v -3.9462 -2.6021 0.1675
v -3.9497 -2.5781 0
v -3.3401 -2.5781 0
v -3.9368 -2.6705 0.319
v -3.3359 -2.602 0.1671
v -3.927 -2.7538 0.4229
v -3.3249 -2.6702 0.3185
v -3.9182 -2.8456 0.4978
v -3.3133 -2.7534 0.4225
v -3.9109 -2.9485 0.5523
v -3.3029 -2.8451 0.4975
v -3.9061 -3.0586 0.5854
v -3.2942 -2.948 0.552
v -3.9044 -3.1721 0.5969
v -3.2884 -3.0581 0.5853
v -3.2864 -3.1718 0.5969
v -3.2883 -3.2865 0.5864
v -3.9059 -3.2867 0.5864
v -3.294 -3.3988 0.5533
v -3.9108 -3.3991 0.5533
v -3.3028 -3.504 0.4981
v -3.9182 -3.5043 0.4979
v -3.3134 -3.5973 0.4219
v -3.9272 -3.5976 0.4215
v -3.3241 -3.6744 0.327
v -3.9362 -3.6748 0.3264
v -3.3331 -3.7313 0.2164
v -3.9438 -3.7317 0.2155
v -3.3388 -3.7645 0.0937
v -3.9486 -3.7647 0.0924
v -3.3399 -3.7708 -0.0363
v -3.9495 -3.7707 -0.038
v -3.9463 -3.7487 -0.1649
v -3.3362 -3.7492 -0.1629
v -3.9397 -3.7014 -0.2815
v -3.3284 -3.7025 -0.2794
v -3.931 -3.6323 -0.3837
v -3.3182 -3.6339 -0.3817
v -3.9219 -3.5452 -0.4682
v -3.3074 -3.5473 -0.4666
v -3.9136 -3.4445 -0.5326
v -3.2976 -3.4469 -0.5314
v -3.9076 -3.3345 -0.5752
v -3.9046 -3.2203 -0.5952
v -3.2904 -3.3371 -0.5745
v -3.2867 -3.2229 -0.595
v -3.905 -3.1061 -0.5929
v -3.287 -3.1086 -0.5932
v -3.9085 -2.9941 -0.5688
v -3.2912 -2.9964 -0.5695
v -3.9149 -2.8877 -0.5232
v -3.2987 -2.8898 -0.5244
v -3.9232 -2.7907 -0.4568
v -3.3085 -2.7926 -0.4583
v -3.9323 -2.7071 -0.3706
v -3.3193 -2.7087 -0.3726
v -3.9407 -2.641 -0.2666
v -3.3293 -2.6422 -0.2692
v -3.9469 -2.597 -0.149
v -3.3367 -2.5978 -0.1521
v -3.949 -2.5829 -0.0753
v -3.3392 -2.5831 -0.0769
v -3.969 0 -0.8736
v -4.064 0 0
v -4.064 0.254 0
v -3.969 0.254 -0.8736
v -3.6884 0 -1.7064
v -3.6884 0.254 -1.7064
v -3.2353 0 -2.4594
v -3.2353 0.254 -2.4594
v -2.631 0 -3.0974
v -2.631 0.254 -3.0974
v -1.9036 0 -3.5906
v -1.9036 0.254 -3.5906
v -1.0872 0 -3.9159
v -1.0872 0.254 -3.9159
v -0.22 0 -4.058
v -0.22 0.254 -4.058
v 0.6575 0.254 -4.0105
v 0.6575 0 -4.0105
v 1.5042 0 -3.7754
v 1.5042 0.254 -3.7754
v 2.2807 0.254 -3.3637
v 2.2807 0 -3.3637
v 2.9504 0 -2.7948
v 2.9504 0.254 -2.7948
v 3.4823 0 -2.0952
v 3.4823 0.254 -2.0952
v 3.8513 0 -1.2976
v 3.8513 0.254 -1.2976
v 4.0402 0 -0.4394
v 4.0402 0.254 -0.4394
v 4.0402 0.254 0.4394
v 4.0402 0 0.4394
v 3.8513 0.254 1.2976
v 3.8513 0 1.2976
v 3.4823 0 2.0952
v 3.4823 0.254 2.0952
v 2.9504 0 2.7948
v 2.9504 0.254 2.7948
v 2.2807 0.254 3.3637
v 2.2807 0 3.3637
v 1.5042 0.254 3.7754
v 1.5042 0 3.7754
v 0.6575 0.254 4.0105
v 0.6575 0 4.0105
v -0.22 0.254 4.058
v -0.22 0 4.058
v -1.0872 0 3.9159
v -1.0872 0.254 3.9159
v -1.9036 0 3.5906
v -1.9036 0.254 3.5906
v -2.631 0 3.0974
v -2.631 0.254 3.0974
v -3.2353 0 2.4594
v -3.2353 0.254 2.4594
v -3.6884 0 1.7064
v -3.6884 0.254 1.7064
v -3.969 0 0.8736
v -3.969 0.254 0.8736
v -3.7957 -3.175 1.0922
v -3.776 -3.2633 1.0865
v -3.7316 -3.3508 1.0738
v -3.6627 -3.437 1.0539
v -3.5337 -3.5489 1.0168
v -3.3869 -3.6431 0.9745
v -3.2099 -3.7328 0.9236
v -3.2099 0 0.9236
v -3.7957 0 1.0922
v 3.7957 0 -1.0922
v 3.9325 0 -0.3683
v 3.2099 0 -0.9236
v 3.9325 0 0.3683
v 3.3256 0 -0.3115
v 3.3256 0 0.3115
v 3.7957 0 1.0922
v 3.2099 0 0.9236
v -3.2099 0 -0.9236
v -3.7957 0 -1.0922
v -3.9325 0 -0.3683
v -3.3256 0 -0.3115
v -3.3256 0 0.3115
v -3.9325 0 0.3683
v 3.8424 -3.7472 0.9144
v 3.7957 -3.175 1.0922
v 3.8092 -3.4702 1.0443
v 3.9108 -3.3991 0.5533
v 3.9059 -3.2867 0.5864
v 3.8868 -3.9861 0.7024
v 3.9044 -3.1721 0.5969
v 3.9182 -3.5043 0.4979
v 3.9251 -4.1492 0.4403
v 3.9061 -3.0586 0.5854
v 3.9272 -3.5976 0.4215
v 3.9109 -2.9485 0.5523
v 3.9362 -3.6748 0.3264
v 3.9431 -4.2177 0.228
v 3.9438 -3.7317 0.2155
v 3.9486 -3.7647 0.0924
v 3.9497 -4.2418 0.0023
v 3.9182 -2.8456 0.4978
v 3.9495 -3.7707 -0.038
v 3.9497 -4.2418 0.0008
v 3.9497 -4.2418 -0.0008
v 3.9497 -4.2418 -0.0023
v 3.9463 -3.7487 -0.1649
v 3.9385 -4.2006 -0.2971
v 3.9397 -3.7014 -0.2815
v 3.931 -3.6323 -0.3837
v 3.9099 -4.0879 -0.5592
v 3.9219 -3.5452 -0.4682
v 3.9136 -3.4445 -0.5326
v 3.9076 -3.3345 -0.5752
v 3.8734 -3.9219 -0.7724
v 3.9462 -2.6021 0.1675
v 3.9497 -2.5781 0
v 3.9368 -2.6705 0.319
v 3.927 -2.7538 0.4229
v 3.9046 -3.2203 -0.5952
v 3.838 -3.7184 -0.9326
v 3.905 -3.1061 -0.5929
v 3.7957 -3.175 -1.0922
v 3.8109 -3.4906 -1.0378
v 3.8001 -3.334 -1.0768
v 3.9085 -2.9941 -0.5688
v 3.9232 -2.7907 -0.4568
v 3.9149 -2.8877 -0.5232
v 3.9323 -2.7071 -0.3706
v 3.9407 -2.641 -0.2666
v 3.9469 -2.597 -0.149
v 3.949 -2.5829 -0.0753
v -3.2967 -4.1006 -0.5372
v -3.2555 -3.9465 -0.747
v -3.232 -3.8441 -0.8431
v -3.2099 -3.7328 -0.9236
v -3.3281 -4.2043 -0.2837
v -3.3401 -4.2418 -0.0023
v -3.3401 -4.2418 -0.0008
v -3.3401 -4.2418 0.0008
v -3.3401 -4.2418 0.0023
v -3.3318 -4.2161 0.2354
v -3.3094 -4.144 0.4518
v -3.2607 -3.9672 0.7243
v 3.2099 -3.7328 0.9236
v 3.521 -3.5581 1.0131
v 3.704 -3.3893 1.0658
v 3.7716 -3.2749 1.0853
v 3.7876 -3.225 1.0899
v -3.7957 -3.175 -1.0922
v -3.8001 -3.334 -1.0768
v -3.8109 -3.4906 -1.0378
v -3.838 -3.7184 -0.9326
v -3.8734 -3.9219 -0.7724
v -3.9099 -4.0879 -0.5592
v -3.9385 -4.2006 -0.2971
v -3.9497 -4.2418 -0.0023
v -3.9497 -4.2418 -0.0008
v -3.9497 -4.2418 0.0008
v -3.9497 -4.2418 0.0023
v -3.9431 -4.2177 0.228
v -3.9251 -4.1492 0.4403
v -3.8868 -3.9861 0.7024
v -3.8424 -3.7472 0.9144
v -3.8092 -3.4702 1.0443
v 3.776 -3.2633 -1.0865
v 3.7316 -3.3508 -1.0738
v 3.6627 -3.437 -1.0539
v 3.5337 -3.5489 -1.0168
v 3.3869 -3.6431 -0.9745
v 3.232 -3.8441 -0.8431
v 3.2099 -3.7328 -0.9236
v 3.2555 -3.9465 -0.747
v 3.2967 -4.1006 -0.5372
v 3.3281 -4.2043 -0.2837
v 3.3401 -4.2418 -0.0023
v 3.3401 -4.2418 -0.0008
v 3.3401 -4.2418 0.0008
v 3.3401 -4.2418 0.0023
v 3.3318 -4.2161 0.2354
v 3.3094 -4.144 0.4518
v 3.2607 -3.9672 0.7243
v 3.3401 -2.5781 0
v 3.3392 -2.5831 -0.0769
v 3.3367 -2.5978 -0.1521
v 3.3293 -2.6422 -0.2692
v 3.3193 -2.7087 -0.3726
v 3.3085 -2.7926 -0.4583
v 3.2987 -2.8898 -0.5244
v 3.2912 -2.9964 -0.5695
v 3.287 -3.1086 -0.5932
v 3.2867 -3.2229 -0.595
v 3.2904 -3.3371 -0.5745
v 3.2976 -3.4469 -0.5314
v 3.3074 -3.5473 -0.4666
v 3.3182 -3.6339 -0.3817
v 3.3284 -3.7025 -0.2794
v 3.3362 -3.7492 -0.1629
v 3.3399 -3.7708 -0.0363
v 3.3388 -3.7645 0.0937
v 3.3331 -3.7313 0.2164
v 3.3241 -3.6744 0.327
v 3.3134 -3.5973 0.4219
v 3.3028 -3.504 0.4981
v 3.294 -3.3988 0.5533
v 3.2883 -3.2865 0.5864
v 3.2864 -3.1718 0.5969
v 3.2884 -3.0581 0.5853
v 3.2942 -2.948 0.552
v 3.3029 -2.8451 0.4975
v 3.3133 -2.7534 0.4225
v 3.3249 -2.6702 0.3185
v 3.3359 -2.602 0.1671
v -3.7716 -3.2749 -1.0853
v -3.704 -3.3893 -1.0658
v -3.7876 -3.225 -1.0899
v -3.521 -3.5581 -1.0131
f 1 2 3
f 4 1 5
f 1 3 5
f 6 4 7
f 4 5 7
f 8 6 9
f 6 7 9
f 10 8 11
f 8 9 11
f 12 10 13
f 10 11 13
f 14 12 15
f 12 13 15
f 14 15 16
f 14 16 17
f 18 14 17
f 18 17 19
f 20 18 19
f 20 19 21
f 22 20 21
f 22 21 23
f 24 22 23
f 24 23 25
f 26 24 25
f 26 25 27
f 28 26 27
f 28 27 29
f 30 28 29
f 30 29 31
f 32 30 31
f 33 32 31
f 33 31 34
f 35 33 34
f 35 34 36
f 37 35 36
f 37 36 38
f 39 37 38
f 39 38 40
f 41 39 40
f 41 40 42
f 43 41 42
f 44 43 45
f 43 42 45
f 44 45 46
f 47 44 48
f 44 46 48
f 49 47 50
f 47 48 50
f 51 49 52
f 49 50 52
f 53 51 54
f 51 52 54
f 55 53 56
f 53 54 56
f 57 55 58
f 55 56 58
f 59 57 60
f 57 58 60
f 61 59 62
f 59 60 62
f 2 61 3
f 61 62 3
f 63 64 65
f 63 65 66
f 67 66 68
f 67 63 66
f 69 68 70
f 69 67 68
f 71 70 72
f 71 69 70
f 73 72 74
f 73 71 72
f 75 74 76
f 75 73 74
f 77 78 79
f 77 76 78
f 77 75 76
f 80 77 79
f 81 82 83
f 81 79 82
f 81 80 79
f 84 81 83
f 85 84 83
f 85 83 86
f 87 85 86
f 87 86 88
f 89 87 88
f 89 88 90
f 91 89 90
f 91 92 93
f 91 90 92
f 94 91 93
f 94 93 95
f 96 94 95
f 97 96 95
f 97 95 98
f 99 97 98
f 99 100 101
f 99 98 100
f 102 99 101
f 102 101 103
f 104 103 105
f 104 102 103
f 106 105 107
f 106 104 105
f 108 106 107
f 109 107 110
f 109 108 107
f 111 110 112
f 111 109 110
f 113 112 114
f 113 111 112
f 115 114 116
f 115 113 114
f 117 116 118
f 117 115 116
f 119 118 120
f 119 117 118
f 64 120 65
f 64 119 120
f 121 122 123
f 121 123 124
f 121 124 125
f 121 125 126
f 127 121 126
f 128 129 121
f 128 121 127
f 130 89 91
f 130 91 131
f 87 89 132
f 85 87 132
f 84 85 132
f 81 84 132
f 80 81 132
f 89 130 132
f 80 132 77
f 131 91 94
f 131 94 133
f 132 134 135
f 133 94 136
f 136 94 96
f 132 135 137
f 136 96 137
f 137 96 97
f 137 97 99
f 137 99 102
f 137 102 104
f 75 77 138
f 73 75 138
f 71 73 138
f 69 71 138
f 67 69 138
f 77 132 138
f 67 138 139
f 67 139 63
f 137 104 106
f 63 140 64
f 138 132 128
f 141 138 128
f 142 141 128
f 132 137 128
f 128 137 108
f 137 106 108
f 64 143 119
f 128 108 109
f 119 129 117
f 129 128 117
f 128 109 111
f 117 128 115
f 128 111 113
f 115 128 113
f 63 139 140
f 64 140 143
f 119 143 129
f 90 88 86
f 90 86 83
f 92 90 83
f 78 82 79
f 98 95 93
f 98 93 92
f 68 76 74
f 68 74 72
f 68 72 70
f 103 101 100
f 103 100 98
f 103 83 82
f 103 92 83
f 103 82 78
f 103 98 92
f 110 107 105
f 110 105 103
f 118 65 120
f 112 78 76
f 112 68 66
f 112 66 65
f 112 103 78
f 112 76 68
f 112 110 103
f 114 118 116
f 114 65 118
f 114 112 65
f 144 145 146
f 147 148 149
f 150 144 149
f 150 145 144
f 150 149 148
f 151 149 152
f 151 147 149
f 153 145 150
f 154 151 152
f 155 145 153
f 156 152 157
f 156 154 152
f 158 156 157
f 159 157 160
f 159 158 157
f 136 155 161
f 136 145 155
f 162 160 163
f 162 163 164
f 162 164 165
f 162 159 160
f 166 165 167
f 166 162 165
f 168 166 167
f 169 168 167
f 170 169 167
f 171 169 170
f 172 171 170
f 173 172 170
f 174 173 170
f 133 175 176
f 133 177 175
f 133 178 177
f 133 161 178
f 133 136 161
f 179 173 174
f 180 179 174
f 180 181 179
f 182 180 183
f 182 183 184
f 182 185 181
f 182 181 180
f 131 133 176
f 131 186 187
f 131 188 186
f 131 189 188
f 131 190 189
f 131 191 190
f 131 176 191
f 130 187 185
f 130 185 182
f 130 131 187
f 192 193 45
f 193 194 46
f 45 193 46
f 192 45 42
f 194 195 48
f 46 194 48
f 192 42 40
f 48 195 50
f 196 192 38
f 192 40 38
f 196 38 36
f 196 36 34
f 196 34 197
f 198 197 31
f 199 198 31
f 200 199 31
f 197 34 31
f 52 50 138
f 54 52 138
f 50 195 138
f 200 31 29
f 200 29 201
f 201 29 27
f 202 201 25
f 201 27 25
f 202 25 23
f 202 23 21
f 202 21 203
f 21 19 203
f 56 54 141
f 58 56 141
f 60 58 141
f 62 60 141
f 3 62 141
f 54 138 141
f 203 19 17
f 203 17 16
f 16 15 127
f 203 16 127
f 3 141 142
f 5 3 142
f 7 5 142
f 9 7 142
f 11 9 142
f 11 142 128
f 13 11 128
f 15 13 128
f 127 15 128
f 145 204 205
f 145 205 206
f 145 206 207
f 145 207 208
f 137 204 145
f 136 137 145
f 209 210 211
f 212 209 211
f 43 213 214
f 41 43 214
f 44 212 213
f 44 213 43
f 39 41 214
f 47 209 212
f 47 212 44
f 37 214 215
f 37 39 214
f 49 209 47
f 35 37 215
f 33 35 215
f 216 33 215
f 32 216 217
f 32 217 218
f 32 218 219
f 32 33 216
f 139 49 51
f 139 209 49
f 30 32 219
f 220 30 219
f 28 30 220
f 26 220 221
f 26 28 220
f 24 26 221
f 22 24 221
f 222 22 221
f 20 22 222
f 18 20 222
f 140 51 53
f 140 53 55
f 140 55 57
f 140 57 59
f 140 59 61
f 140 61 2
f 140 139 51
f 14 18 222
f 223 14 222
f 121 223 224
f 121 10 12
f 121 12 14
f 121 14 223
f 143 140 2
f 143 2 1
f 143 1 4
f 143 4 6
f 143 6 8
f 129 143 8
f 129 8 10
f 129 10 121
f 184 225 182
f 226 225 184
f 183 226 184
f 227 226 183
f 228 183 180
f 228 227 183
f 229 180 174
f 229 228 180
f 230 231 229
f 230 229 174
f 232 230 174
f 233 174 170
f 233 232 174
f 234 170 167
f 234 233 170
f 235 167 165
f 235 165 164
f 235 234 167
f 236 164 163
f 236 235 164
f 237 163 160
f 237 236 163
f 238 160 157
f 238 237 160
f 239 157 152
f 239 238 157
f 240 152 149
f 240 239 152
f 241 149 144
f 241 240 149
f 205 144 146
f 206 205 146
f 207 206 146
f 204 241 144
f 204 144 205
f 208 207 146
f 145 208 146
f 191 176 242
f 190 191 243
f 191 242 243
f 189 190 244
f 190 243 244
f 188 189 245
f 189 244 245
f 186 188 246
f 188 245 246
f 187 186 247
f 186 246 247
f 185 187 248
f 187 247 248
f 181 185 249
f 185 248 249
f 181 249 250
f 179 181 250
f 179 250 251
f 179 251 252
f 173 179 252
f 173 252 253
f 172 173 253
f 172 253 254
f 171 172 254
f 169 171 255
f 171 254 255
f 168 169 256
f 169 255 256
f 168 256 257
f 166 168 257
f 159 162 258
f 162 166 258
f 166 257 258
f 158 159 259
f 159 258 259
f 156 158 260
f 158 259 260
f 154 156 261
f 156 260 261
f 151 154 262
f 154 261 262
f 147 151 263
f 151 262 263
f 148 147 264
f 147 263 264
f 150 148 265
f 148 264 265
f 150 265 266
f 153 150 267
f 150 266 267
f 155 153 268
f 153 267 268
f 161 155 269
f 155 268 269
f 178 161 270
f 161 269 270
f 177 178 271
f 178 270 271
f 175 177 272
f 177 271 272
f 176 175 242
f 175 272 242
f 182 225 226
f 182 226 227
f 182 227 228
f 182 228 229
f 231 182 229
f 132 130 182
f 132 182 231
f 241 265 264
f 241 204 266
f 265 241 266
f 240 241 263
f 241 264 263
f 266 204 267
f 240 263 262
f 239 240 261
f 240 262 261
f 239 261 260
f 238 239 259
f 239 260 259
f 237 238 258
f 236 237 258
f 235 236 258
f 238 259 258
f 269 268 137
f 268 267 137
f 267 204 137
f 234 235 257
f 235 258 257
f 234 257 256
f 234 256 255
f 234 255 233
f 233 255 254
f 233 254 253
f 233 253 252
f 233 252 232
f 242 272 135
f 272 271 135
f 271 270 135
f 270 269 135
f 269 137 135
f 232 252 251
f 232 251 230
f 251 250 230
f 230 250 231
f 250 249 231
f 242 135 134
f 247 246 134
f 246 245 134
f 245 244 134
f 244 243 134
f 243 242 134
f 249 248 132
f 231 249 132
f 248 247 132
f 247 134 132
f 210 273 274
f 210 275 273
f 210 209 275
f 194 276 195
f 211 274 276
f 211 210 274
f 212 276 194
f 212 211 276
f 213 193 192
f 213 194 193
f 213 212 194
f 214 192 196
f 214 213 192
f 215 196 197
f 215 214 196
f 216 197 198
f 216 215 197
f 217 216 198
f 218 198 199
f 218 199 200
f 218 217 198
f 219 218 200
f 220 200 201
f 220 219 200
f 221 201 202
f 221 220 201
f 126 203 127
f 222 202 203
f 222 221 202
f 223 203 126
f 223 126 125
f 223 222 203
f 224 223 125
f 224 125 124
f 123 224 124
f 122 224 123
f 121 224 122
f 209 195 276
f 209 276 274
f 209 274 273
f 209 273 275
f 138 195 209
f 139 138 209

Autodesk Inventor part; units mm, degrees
sketch "Sketch_2" plane through (0, 0, 0) normal (0, 1, 0) x (-1, 0, 0)
  circle A0 centre (0, 0) radius 4.064
extrude "Extrusion1" add sketch "Sketch_2" along normal blind 0.254
sketch "Sketch_3" plane through (0, 0, 0) normal (0, 1, 0) x (-1, 0, 0)
  arc A0 (-3.2099, 0.9236) -> (-3.2099, -0.9236) centre (0, 0) ccw
  line L0 (-3.2099, 0.9236) -> (-3.7957, 1.0922)
  arc A1 (-3.7957, 1.0922) -> (-3.7957, -1.0922) centre (0, 0) ccw
  line L1 (-3.7957, -1.0922) -> (-3.2099, -0.9236)
extrude "Extrusion2" add sketch "Sketch_3" against normal blind 4.2418
sketch "Sketch_4" plane through (0, 0, 0) normal (0, 1, 0) x (-1, 0, 0)
  arc A0 (3.7957, -1.0922) -> (3.7957, 1.0922) centre (0, 0) ccw
  line L0 (3.7957, 1.0922) -> (3.2099, 0.9236)
  arc A1 (3.2099, -0.9236) -> (3.2099, 0.9236) centre (0, 0) ccw
  line L1 (3.2099, -0.9236) -> (3.7957, -1.0922)
extrude "Extrusion3" add sketch "Sketch_4" against normal blind 4.2418
sketch "Sketch_5" plane through (0, 0, 0) normal (1, 0, 0) x (0, 1, 0)
  circle A0 centre (-3.175, 0) radius 0.5969
extrude "Extrusion4" cut sketch "Sketch_5" along normal mid plane 16.3576
sketch "Sketch_6" plane through (0, 0, 0) normal (1, 0, 0) x (0, 1, 0)
  line L0 (-4.4958, 1.0922) -> (-4.4958, -1.0922)
  line L1 (-4.4958, -1.0922) -> (-3.175, -1.0922)
  arc A0 (-3.175, 1.0922) -> (-3.175, -1.0922) centre (-3.1493, 0) ccw
  line L2 (-3.175, 1.0922) -> (-4.4958, 1.0922)
extrude "Extrusion5" cut sketch "Sketch_6" along normal mid plane 16.3576
ref_plane "to_trmnl_hold_XY" through (0, 0, 0) normal (0, -1, 0) x (1, 0, 0)
ref_plane "to_trmnl_hold_YZ" through (0, 0, 0) normal (1, 0, 0) x (0, 0, 1)
ref_plane "to_trmnl_hold_ZX" through (0, 0, 0) normal (0, 0, 1) x (0, -1, 0)
properties part number "SB4011NO-trmnls"
